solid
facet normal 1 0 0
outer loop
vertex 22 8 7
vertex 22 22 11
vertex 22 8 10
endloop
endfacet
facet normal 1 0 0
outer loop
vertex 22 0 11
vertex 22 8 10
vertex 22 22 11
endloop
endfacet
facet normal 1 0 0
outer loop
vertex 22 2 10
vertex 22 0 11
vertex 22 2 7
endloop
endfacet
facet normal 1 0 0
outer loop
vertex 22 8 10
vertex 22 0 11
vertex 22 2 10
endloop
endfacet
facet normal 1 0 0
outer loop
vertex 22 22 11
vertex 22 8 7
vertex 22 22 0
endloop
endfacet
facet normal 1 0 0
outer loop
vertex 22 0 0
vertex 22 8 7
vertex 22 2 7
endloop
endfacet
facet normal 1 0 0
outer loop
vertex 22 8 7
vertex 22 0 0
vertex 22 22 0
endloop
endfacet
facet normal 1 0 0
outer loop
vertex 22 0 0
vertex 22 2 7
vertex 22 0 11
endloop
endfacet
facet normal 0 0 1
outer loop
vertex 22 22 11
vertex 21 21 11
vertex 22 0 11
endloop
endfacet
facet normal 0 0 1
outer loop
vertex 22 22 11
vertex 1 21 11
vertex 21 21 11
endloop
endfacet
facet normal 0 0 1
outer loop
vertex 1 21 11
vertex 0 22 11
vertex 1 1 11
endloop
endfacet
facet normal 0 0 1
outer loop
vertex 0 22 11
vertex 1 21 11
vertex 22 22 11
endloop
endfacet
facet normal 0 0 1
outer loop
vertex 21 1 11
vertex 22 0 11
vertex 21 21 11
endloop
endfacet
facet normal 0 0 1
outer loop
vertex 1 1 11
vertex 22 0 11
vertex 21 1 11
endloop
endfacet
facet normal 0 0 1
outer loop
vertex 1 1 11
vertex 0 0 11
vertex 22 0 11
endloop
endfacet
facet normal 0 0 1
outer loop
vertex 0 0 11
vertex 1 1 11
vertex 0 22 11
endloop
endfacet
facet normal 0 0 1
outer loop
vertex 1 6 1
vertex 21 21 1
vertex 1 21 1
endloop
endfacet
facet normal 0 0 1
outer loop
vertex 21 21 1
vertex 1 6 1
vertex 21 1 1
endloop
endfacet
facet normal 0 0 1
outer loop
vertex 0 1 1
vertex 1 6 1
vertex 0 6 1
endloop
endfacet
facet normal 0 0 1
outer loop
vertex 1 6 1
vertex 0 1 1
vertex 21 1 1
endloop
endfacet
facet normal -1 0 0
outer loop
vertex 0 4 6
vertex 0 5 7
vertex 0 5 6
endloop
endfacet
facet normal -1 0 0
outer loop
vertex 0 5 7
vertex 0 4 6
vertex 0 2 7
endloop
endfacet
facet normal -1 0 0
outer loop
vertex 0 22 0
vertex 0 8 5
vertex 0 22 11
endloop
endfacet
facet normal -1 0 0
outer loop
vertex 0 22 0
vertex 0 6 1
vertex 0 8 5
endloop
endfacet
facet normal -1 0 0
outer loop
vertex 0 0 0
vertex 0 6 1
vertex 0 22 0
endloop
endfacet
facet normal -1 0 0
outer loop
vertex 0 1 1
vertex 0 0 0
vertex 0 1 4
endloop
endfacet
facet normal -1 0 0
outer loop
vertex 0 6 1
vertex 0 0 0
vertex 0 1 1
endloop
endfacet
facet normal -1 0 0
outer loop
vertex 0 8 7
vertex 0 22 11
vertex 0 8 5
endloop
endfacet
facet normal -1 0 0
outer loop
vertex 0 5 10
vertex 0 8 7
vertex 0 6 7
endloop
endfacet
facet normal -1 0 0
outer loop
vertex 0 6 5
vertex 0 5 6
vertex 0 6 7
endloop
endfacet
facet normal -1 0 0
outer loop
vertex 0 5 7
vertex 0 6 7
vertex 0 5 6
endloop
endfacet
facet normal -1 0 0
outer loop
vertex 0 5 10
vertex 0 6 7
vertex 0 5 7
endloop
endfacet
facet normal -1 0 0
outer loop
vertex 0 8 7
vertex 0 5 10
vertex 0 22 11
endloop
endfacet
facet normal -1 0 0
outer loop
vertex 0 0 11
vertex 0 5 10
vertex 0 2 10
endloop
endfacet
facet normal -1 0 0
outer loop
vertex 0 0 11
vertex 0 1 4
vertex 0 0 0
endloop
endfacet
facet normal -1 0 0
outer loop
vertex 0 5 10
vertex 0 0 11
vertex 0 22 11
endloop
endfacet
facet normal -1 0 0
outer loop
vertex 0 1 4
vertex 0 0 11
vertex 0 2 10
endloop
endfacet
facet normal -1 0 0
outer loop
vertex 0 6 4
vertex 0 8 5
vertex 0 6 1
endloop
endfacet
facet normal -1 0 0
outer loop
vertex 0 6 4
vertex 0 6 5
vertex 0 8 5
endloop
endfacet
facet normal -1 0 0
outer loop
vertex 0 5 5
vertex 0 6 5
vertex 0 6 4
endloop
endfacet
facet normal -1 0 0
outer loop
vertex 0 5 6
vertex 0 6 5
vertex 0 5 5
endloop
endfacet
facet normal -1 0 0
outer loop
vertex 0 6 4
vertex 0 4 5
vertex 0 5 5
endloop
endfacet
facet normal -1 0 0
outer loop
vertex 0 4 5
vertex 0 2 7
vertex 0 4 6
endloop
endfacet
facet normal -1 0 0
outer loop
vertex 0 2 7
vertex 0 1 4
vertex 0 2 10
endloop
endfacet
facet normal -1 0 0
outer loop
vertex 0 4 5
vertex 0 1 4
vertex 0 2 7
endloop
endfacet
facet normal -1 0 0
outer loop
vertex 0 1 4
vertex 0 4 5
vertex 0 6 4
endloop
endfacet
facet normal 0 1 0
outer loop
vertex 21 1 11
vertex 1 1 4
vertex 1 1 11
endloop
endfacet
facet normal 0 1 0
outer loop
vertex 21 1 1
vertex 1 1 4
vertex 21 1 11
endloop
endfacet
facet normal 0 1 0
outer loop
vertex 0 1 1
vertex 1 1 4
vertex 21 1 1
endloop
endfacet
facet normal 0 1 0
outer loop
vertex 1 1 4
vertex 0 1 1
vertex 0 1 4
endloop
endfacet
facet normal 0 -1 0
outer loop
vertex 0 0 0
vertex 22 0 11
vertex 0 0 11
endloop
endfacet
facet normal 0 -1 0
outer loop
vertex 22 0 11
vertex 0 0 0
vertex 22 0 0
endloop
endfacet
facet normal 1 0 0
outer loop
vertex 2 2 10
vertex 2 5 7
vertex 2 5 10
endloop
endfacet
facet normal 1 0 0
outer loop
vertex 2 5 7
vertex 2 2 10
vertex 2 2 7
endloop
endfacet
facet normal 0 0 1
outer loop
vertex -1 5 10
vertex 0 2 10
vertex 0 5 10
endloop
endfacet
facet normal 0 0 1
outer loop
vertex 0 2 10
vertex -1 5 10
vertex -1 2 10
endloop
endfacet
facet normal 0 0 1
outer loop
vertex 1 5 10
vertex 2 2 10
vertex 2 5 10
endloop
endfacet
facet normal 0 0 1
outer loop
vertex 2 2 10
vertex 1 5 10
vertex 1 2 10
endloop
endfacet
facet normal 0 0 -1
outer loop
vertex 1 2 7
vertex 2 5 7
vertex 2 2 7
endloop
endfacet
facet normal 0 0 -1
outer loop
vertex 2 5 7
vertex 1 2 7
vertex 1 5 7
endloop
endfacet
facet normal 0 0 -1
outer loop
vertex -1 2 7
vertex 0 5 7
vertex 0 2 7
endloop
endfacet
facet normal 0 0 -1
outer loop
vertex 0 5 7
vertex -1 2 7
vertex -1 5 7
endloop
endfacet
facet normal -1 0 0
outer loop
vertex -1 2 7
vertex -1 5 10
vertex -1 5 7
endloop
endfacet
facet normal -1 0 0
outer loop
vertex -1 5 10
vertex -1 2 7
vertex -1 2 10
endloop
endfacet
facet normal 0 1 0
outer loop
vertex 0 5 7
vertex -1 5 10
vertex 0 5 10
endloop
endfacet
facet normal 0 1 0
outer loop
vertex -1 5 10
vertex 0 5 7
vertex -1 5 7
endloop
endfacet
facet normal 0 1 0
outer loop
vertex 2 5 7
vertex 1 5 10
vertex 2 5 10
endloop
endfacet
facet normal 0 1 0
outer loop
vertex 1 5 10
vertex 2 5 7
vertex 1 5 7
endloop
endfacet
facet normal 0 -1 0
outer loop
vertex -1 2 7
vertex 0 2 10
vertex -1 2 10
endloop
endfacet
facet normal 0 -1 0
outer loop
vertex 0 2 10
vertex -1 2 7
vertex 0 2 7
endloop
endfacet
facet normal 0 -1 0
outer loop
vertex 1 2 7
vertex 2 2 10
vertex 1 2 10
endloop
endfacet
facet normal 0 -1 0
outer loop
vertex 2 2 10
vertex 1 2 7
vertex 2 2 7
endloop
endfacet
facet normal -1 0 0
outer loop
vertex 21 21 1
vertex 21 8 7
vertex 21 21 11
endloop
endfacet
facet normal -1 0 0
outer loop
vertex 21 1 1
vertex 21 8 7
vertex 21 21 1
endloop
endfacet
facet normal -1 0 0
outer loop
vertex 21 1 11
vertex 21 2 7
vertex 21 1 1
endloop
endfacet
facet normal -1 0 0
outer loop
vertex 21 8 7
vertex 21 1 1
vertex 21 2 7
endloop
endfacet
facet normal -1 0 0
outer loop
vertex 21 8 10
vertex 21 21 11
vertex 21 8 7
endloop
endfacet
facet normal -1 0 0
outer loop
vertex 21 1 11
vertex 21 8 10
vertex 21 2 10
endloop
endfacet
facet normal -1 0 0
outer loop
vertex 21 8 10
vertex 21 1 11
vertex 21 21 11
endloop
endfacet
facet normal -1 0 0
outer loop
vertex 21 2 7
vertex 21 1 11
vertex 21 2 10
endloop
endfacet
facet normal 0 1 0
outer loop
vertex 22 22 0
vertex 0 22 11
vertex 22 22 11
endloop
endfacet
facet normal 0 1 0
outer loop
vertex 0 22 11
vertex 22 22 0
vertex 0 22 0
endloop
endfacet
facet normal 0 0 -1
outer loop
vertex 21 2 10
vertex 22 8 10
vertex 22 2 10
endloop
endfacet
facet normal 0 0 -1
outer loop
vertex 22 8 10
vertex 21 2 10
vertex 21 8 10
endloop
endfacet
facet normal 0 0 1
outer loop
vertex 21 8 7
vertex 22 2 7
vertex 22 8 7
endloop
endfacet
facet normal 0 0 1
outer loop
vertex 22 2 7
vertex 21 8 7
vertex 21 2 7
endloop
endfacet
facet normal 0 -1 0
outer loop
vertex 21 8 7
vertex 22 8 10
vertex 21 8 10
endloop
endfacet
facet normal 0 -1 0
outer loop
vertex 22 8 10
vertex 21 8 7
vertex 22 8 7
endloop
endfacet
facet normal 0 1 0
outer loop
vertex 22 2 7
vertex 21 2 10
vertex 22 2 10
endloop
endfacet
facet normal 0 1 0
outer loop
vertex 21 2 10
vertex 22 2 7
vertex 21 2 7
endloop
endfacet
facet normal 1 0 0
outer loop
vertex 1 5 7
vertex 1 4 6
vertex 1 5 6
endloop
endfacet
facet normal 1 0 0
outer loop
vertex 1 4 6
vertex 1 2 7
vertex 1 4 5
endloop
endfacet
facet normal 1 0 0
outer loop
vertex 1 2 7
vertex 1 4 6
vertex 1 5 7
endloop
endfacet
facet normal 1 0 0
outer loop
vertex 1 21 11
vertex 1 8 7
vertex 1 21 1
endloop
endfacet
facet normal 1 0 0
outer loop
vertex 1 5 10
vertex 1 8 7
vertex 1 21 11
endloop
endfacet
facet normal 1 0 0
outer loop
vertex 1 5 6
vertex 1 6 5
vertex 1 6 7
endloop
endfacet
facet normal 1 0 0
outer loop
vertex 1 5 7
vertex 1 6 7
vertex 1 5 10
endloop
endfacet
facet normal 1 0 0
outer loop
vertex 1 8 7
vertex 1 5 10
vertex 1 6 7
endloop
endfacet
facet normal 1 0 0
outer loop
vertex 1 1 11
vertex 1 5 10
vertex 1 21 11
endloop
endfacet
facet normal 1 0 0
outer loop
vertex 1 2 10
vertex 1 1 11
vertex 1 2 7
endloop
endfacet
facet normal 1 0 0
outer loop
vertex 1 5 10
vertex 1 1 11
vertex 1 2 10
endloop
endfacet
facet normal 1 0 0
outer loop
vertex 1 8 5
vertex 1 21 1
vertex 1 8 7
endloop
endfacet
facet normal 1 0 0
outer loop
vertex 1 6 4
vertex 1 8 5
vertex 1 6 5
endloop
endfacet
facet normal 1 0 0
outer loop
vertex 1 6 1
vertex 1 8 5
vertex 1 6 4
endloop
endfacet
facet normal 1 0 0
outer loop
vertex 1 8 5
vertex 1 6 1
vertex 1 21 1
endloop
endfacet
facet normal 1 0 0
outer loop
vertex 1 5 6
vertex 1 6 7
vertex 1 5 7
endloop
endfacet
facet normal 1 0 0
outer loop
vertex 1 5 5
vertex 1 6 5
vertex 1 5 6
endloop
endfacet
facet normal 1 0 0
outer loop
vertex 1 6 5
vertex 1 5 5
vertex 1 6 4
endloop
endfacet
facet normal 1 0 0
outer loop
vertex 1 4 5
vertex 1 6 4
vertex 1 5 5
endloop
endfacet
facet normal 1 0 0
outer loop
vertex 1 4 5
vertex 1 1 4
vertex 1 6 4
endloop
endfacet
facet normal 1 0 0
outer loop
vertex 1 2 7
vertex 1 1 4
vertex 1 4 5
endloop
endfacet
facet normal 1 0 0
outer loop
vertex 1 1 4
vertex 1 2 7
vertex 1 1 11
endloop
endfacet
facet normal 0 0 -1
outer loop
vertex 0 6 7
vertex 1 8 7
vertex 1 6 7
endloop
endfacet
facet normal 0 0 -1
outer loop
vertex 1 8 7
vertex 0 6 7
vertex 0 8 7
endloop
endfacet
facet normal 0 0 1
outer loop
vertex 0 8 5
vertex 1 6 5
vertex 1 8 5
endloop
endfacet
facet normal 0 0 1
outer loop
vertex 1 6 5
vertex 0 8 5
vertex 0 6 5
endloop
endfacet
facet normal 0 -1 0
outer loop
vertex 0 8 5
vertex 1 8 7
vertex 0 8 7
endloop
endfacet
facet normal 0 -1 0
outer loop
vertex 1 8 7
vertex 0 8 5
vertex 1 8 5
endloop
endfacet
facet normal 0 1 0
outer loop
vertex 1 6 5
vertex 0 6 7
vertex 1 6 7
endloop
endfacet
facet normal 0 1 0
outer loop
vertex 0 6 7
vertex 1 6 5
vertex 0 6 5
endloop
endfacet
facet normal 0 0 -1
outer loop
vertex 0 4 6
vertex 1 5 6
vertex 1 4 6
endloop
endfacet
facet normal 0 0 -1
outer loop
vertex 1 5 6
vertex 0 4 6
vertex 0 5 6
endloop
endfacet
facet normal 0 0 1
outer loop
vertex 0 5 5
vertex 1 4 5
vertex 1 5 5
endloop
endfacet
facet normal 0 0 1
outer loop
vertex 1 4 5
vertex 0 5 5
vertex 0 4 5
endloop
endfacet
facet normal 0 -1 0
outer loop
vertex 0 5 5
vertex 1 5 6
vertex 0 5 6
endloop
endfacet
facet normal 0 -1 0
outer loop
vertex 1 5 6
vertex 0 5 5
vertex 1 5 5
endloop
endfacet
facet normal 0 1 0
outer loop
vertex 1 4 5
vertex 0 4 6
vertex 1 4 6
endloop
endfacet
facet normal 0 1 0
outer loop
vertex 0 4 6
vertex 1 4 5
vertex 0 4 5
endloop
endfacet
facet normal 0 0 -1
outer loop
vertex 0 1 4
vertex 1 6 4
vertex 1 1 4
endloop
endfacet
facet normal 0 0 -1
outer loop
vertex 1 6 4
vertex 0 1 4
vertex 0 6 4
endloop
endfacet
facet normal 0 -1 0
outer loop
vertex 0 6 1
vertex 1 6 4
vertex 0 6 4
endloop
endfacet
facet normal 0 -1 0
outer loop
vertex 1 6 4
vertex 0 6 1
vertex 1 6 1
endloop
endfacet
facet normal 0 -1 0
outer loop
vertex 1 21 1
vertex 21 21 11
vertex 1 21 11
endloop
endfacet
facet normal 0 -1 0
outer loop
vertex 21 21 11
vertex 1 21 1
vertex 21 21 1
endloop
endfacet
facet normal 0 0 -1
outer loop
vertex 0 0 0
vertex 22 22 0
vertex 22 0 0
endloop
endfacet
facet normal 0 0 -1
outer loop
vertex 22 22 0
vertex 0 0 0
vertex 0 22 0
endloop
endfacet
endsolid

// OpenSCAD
w=20;
l=20;
h=10;
t=1;

translate([0,w+t,t]){
    difference(){
cube([l+2*t,t,h]);
}

}

translate([0,0,t]){
    difference(){
cube([l+2*t,t,h]);
}
translate([-t,2,h-4]){
    cube([3*t,3,3]);
    }    
}

translate([l+t,0,t]){
   difference(){
    cube([t,w+2*t,h]);
        
    translate([-t,2,h-4]){
    cube([3*t,6,3]);
    }    
        
}
}

translate([0,0,t]){
difference(){
translate([0,0,0]){
    cube([t,w+2*t,h]);
}

translate([-t,6,4]){
    cube([3*t,2,2]);
}

translate([-t,4,4]){
    cube([3*t,1,1]);
}

translate([-t,0,0]){
    cube([3*t,6,3]);
}

}
}

cube([l+2*t,w+2*t,t]);
